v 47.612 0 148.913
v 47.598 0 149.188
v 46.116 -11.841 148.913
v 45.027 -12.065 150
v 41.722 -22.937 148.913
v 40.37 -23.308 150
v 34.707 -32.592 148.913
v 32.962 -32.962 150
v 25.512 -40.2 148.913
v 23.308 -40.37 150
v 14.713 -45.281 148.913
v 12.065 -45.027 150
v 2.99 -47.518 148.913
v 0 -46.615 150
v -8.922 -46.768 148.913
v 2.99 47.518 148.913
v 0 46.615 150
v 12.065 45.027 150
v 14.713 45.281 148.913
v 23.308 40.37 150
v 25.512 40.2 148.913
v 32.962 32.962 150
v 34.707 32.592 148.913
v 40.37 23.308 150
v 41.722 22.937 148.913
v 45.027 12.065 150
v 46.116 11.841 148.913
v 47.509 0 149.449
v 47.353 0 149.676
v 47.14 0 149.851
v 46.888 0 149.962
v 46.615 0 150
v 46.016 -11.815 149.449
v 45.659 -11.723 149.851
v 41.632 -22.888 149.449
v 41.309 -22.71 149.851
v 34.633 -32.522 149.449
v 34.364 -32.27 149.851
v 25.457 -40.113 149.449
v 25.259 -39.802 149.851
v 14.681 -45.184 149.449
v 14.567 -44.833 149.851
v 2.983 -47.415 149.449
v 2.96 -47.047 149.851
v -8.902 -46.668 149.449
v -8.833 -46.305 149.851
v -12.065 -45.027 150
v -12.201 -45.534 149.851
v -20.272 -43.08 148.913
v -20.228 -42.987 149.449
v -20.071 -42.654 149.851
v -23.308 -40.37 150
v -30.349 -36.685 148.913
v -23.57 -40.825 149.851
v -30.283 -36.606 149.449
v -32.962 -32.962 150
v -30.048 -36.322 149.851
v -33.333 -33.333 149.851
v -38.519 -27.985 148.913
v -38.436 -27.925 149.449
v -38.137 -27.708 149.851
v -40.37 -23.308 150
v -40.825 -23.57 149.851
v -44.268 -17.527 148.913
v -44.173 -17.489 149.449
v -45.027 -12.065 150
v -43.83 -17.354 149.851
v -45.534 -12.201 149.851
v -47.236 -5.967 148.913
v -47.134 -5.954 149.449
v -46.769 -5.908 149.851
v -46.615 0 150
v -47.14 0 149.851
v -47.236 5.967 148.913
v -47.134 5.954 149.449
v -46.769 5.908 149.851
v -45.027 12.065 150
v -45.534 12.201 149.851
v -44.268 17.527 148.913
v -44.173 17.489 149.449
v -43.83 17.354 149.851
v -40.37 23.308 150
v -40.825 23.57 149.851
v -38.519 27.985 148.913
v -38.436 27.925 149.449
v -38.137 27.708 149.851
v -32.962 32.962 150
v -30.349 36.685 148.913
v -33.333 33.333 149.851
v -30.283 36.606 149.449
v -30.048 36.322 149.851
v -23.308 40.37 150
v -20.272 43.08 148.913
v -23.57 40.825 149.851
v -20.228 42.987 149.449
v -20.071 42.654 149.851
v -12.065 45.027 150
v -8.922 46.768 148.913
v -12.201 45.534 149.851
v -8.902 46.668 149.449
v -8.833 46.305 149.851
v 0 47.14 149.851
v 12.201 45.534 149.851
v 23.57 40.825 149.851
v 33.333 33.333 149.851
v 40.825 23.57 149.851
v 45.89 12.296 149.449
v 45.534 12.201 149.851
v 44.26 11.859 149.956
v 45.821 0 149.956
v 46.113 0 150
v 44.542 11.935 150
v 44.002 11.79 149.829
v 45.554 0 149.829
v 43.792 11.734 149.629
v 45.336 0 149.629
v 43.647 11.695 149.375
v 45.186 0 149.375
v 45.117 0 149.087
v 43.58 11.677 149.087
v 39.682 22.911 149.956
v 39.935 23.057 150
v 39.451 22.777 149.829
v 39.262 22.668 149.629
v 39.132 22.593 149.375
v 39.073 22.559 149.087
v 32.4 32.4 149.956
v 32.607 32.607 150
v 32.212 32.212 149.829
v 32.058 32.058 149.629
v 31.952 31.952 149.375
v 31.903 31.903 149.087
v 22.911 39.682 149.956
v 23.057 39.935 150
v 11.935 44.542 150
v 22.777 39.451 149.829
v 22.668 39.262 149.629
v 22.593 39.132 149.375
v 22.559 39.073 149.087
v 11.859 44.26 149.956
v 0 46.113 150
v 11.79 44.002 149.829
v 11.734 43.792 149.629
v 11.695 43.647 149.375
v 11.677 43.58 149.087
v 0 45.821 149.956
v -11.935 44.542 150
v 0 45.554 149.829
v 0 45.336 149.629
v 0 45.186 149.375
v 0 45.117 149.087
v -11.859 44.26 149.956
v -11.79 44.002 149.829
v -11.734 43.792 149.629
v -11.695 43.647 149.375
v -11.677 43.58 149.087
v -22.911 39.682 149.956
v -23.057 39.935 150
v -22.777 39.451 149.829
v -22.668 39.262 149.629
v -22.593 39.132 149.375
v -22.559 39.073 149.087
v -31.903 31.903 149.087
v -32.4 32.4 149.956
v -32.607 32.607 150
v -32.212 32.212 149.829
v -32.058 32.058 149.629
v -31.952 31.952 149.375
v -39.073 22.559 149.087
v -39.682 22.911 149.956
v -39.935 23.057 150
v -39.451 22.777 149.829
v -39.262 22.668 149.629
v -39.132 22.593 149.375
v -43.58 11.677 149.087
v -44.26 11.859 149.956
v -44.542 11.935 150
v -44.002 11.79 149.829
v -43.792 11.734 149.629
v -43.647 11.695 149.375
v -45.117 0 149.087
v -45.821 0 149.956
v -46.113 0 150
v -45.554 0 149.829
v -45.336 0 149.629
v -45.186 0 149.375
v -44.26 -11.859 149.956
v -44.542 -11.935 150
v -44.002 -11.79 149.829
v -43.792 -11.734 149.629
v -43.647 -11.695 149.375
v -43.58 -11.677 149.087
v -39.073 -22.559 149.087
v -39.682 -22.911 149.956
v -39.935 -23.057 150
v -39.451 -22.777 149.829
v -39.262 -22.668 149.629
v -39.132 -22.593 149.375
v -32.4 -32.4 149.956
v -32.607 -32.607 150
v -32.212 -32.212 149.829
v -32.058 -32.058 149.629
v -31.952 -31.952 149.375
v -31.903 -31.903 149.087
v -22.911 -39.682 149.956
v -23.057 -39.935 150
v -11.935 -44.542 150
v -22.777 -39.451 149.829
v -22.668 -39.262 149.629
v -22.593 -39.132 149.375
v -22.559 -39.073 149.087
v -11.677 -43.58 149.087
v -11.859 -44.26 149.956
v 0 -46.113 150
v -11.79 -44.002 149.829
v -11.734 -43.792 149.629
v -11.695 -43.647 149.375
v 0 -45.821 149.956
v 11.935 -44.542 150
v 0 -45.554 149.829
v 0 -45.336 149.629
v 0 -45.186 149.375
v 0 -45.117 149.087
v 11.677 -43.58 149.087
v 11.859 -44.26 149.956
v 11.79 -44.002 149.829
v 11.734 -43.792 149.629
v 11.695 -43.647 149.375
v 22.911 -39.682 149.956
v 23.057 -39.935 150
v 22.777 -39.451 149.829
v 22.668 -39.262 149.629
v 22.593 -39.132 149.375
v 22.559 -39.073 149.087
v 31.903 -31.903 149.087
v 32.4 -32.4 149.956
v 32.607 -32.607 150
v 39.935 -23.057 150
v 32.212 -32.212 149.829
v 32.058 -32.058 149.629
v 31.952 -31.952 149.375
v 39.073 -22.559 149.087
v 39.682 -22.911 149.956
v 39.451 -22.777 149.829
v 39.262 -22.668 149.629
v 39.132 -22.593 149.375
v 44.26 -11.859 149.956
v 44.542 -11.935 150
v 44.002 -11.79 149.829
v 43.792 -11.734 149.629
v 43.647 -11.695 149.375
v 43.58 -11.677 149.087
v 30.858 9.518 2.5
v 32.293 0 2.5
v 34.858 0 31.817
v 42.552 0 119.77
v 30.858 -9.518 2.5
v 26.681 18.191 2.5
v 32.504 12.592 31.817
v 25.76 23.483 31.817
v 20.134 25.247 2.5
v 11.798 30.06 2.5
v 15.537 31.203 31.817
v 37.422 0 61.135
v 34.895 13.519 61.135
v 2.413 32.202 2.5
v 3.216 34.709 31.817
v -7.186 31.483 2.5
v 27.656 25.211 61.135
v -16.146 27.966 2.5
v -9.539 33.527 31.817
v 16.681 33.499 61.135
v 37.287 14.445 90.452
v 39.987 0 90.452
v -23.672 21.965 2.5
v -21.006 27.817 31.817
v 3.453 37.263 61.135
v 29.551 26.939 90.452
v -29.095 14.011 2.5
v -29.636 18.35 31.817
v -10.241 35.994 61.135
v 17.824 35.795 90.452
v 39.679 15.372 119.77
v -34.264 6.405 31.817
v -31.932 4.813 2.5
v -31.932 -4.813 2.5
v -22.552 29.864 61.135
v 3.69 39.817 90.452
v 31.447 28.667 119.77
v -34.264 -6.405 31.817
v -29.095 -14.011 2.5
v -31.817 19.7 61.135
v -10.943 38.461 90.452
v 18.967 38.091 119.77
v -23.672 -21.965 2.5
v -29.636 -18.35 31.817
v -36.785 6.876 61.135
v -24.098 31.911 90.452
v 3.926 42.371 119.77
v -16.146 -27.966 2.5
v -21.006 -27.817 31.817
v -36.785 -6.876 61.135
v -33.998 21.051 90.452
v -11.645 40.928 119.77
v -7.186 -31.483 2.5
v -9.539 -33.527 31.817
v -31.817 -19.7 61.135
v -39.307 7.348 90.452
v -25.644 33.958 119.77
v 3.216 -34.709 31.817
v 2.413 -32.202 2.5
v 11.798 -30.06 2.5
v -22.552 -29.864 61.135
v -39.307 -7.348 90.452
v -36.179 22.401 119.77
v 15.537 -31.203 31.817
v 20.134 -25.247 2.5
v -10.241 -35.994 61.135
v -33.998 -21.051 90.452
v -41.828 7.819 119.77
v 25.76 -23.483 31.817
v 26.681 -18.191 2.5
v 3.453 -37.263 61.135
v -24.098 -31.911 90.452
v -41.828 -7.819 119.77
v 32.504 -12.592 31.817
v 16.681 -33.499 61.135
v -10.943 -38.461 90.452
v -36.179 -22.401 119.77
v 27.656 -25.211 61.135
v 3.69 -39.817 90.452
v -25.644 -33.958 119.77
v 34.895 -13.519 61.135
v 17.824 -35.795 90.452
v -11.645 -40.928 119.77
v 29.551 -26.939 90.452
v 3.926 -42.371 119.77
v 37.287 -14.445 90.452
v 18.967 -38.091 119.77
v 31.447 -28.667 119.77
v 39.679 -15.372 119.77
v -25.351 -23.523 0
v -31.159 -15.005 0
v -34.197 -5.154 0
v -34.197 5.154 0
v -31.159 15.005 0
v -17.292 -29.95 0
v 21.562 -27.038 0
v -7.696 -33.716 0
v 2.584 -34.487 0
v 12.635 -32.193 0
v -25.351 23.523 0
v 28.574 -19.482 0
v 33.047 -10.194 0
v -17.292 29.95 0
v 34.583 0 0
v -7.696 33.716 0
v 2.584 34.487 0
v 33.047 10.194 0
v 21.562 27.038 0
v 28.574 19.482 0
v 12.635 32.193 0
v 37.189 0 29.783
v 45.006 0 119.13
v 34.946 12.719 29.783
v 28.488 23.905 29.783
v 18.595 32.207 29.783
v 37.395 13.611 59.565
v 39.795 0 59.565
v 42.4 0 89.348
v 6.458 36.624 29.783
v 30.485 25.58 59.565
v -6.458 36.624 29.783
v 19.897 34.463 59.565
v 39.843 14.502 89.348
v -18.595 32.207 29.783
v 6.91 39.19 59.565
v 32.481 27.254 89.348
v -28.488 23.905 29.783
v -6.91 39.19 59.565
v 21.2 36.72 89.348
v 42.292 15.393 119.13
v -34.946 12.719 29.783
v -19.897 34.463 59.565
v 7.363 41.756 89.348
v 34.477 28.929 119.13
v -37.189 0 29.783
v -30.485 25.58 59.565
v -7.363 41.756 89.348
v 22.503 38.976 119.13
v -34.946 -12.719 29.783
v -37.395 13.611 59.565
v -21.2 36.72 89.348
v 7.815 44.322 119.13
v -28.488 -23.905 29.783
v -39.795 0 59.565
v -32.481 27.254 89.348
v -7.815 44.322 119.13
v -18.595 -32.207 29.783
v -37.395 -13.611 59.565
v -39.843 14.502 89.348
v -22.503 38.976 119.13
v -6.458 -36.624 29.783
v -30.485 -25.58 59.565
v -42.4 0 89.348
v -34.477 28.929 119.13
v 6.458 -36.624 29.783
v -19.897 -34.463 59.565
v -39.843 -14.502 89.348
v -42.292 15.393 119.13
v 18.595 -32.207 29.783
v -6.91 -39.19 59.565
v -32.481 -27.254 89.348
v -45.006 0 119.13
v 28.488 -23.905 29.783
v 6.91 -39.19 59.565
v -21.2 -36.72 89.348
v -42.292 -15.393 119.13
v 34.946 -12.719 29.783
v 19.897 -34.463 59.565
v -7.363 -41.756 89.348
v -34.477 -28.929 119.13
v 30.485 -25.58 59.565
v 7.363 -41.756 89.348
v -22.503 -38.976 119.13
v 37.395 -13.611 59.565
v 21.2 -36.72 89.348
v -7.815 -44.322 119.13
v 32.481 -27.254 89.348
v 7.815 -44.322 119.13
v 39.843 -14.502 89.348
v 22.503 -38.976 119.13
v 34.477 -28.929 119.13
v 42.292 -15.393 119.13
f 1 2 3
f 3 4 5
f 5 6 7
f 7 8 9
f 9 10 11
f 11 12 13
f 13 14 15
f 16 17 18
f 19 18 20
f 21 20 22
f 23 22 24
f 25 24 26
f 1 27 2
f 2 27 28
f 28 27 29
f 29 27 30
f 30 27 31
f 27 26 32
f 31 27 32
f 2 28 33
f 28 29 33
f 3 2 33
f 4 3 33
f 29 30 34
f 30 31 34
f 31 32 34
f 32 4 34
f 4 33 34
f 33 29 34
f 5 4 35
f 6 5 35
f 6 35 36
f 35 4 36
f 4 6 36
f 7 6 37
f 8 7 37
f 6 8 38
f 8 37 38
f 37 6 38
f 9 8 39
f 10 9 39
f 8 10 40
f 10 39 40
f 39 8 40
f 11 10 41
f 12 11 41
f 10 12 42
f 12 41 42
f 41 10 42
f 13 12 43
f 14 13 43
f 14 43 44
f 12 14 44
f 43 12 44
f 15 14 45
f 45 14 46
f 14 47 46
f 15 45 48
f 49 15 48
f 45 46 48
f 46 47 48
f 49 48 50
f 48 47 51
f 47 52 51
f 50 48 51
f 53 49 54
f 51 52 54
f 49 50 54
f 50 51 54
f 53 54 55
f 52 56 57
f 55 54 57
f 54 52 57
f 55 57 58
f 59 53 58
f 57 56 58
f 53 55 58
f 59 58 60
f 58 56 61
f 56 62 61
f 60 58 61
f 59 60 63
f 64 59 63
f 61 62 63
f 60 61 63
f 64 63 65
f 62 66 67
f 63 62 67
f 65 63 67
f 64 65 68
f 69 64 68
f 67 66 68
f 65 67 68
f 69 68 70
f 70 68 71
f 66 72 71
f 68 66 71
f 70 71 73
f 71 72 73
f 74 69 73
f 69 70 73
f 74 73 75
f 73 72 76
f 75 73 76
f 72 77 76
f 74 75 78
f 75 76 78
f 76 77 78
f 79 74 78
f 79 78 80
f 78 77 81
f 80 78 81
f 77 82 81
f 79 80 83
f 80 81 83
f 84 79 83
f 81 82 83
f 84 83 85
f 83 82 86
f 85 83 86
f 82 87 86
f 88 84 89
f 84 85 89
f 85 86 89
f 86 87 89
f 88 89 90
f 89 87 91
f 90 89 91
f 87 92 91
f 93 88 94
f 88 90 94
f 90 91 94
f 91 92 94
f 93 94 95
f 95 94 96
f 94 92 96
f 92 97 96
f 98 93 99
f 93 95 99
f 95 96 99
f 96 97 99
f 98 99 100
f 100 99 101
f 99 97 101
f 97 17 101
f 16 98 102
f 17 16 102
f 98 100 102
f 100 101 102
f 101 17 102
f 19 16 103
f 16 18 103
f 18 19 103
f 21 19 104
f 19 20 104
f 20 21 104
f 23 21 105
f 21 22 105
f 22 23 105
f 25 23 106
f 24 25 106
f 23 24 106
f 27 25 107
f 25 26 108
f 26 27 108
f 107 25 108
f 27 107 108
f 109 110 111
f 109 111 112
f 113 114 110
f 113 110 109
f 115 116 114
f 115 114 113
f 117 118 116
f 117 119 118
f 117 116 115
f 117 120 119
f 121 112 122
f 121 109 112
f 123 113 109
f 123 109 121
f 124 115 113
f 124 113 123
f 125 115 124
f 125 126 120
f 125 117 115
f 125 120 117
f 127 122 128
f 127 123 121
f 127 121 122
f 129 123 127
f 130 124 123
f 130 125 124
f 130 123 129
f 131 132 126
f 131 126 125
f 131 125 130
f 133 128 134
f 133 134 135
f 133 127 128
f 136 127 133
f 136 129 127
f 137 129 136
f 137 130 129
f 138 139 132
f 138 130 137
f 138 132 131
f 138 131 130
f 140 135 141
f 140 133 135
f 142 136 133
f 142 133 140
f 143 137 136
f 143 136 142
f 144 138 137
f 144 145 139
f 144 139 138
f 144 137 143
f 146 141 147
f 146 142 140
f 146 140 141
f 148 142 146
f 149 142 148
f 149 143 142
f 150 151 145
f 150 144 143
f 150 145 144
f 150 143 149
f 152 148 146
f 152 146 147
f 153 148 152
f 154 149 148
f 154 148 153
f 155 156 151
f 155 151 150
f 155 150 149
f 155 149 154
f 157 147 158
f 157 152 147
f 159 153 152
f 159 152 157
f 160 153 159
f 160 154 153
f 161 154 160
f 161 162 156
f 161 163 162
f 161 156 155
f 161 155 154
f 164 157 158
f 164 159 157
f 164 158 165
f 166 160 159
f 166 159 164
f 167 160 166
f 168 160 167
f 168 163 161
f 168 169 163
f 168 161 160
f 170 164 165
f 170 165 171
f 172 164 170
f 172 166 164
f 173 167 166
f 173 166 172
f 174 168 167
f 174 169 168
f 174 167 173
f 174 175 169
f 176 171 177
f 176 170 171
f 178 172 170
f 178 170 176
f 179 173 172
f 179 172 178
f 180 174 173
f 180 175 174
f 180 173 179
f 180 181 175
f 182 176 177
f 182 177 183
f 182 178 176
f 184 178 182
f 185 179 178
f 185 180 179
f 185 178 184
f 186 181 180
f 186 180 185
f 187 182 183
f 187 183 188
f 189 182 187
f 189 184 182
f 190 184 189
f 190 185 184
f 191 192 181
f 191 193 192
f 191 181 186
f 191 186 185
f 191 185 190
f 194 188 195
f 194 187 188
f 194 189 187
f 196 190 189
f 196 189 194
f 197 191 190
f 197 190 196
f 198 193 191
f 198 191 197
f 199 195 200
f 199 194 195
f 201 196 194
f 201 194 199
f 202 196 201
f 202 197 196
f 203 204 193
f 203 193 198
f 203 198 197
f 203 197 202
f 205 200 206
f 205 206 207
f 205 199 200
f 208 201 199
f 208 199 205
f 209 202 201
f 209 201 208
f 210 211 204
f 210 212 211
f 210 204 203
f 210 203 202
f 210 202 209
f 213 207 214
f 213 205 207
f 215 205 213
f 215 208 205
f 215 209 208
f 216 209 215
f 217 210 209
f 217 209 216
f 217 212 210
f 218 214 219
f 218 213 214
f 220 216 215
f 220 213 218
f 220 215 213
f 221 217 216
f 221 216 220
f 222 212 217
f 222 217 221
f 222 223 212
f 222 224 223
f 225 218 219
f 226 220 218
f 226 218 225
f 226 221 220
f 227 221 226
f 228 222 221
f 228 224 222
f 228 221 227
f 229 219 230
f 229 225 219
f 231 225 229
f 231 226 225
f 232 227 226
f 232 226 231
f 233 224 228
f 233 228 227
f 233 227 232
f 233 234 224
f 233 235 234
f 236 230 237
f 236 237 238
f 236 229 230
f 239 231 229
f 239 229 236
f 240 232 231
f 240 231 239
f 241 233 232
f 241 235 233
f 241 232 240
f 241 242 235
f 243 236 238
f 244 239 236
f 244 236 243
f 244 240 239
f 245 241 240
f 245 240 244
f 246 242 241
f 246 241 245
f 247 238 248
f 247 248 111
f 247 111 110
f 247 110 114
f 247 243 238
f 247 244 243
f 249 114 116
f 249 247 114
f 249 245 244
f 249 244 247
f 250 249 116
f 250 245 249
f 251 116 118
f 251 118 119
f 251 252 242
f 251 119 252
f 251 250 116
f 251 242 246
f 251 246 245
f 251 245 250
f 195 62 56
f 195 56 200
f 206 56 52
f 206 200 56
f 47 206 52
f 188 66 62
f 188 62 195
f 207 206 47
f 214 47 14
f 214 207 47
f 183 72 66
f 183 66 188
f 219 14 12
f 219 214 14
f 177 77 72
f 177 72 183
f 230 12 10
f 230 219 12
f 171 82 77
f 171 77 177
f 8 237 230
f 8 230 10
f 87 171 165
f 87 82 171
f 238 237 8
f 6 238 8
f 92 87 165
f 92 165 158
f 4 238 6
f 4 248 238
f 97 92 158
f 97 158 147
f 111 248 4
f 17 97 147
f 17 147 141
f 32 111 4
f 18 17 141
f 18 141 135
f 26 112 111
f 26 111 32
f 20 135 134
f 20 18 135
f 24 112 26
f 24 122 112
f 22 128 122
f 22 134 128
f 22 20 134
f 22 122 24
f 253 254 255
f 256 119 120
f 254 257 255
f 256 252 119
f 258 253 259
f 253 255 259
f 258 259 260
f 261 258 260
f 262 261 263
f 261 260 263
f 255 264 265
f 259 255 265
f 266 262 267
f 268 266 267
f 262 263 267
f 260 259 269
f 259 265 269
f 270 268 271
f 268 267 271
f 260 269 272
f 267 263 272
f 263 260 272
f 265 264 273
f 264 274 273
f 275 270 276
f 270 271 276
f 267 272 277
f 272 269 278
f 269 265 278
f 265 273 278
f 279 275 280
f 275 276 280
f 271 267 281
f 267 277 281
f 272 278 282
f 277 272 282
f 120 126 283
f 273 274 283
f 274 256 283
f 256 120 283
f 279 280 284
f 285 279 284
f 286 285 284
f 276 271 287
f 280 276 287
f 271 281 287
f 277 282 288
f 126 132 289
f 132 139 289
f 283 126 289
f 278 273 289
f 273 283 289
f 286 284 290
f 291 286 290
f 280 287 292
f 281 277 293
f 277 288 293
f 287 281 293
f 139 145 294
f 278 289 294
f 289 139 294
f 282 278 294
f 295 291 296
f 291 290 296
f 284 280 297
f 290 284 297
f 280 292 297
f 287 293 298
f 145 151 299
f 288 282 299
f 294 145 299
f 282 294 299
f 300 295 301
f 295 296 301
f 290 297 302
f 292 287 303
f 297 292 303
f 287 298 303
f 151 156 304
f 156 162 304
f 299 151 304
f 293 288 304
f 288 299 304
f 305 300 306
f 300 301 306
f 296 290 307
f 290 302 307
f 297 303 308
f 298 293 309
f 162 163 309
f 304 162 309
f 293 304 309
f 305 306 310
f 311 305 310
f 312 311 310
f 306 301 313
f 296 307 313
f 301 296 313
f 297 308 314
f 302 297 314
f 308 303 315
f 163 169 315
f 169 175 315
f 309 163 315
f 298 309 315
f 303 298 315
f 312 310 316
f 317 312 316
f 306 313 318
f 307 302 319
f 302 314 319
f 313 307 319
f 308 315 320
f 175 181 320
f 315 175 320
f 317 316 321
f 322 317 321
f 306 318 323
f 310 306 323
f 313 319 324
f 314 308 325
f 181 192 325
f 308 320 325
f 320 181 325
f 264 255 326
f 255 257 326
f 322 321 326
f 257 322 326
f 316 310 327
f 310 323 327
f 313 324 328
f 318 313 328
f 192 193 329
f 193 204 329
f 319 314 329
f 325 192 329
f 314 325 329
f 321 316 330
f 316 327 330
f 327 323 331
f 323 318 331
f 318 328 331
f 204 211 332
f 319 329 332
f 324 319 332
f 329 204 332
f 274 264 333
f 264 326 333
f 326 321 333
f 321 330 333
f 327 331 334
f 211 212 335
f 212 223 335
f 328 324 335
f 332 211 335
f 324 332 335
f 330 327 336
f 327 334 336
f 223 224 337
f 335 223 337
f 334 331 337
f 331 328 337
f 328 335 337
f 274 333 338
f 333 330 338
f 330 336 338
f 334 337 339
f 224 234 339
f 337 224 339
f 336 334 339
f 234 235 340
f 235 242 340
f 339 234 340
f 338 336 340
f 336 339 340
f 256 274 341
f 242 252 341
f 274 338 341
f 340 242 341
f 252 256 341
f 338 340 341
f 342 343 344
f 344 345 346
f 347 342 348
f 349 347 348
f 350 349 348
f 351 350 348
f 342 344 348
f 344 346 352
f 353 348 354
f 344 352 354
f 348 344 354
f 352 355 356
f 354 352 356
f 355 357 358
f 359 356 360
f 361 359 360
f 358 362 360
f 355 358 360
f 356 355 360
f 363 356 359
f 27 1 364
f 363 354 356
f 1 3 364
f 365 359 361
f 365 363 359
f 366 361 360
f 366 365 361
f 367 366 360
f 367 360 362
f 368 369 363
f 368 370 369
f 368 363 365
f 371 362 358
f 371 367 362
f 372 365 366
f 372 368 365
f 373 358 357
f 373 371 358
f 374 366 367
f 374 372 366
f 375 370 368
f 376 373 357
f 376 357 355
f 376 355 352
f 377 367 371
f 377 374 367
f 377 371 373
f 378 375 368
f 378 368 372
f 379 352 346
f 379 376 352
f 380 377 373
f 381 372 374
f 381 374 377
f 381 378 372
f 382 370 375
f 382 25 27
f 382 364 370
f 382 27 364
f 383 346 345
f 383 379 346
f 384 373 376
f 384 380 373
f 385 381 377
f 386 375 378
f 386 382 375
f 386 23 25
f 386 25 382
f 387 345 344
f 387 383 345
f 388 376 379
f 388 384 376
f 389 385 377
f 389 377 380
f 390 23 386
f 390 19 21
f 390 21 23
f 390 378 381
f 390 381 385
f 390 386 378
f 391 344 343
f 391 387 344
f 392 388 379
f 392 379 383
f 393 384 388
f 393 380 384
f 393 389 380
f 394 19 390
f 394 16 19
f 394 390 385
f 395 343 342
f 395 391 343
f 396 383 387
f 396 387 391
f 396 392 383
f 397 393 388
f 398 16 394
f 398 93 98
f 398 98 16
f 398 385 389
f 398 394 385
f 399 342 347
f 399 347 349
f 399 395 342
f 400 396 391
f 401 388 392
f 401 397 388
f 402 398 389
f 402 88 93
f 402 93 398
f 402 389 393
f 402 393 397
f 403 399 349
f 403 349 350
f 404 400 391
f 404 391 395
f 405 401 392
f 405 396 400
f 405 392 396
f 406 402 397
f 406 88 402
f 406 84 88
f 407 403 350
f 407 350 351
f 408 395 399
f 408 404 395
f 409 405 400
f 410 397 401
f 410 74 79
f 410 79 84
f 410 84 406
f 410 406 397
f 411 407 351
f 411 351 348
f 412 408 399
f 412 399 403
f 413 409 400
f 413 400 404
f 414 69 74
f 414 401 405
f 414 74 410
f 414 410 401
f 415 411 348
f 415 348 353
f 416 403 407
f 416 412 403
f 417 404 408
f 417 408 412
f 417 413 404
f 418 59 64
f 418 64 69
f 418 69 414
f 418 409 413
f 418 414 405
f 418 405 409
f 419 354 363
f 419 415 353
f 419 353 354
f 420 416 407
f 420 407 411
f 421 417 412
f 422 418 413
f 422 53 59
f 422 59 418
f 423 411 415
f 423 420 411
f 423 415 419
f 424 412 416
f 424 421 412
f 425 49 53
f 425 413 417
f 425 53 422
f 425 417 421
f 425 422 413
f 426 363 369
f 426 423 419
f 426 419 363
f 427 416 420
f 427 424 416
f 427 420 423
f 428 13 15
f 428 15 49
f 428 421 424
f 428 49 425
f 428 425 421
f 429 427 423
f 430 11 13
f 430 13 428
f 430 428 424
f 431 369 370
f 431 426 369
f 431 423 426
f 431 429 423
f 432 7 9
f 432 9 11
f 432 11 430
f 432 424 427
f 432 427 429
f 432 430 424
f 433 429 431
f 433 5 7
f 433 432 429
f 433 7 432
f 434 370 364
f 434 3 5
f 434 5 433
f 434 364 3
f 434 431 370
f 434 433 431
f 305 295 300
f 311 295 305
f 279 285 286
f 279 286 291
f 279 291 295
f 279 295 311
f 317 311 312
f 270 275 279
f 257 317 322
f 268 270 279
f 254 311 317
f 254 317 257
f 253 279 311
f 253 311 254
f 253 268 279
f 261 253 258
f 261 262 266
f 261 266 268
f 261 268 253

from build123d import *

# Parameters (mm, degrees)
F0_R     = 34.5834158621
F1_DEPTH = 150
F1_TAPER = -5
F2_T     = -2.5
F3_R     = 1


with BuildPart() as f1:
    # F0 (on Top) → F1 (new body)
    with BuildSketch(Plane.XY):
        Circle(F0_R)
    extrude(amount=F1_DEPTH, taper=F1_TAPER)

    # F2
    f2_openings = [f1.faces().sort_by_distance(p)[0] for p in [
        (0, 0, 150),
    ]]
    offset(amount=F2_T, openings=f2_openings, kind=Kind.INTERSECTION)

    # F3
    f3_edges = [f1.edges().sort_by_distance(p)[0] for p in [
        (-47.706715, 0, 150),
        (-45.197166, 0, 150),
    ]]
    fillet(f3_edges, radius=F3_R)


solid = f1.part
